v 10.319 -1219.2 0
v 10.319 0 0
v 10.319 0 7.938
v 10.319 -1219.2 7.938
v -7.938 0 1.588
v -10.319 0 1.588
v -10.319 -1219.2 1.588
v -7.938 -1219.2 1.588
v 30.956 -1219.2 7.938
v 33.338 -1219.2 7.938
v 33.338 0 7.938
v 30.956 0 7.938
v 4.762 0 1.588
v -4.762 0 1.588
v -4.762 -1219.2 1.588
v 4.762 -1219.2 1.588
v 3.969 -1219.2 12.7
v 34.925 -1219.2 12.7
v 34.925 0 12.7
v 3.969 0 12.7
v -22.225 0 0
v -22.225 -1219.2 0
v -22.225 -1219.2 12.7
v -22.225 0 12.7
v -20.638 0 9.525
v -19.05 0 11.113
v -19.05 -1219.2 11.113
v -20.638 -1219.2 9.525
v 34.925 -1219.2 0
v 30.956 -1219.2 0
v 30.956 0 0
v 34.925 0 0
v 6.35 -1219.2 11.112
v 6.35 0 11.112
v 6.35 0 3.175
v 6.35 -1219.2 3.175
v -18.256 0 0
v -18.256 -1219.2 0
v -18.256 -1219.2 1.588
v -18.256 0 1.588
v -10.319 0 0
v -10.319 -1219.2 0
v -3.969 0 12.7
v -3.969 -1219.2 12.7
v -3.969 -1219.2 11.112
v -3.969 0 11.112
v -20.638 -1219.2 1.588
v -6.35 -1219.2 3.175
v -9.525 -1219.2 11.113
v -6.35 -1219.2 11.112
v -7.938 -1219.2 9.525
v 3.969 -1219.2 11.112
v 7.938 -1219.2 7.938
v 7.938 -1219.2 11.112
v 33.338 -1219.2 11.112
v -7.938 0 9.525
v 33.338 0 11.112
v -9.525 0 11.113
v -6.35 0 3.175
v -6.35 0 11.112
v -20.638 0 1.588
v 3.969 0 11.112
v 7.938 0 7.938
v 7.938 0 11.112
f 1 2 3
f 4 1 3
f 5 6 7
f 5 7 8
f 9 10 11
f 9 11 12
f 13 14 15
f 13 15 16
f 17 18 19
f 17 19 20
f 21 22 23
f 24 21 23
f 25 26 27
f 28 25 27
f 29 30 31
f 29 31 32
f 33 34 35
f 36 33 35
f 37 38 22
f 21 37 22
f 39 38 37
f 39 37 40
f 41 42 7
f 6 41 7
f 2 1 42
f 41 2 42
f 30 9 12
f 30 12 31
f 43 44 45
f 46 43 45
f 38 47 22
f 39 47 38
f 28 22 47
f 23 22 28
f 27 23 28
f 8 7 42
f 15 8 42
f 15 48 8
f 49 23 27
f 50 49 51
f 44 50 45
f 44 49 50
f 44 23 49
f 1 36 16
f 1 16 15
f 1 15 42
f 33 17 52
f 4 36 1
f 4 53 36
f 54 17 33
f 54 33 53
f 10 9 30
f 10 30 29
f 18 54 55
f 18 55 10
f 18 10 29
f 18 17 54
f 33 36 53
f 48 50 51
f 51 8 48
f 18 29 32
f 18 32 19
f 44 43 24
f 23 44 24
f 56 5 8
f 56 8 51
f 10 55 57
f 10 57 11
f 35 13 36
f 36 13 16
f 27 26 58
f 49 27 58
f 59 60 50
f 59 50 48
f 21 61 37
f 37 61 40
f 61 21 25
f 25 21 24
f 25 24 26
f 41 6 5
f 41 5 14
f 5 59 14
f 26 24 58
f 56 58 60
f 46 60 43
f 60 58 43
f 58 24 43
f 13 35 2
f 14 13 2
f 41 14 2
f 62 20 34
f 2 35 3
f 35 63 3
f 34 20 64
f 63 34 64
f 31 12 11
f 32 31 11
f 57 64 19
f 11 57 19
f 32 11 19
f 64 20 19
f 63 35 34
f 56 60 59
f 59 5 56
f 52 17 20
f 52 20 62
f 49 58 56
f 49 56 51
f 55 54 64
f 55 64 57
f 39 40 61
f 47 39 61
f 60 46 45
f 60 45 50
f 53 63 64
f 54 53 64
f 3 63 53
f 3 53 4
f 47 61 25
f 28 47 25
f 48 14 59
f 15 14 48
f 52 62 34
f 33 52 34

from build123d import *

# Parameters (mm, degrees)
F1_DEPTH  = 1219.2
F2_SIZE   = 1.5875
F5_W      = 34.925
F5_H      = 12.7
F6_DEPTH  = 1219.201
F9_DEPTH  = 1219.201
F10_W     = 2.38125
F10_H     = 6.35
F11_DEPTH = 1219.2


with BuildPart() as f1:
    # F0 (on Front) → F1 (new body)
    with BuildSketch(Plane.XZ):
        Polygon((0, 1.5875), (0, 0), (10.31875, 0), (10.31875, 1.5875), (7.9375, 1.5875), (7.9375, 11.1125), (14.2875, 11.1125), (14.2875, 12.7), (3.96875, 12.7), (3.96875, 11.1125), (6.35, 11.1125), (6.35, 1.5875), align=None)
    extrude(amount=F1_DEPTH)

    # F2
    f2_edges = [f1.edges().sort_by_distance(p)[0] for p in [
        (6.35, -609.6, 1.5875),
        (7.9375, -609.6, 11.1125),
    ]]
    chamfer(f2_edges, length=F2_SIZE)

    # F3: F1 across face


with BuildPart() as f1_1:
    add(f1.part)
    add(f1.part.mirror(Plane(origin=(14.2875, -609.6, 11.90625), x_dir=(0, 1, 0), z_dir=(1, 0, 0))))

    # F4: F1 across face


with BuildPart() as f1_2:
    add(f1_1.part)
    add(f1_1.part.mirror(Plane(origin=(28.575, -609.6, 0.79375), x_dir=(0, 1, 0), z_dir=(1, 0, 0))))

    # F5 (on face) → F6 (cut, through all)
    with BuildSketch(Plane.XZ.offset(1219.2)):
        with Locations((39.6875, 6.35)):
            Rectangle(F5_W, F5_H)
    extrude(amount=-F6_DEPTH, mode=Mode.SUBTRACT)

    # F7: F1 across face


with BuildPart() as f1_3:
    add(f1_2.part)
    add(f1_2.part.mirror(Plane(origin=(0, -609.6, 0.79375), x_dir=(0, -1, 0), z_dir=(-1, 0, 0))))

    # F8 (on face) → F9 (cut, through all)
    with BuildSketch(Plane.XZ.offset(1219.2)):
        Polygon((7.9375, 12.7), (7.9375, 9.525), (9.525, 11.1125), (19.05, 11.1125), (20.6375, 9.525), (20.6375, 1.5875), (18.25625, 1.5875), (18.25625, 0), (22.225, 0), (22.225, 12.7), align=None)
    extrude(amount=-F9_DEPTH, mode=Mode.SUBTRACT)

    # F10 (on face) → F11 (join, through all)
    with BuildSketch(Plane.XZ.offset(1219.2)):
        Polygon((34.925, 12.7), (7.9375, 12.7), (7.9375, 11.1125), (33.3375, 11.1125), (33.3375, 7.9375), (30.95625, 7.9375), (30.95625, 0), (34.925, 0), align=None)
        with Locations((9.128125, 4.7625)):
            Rectangle(F10_W, F10_H)
    extrude(amount=-F11_DEPTH)


solid = f1_3.part
